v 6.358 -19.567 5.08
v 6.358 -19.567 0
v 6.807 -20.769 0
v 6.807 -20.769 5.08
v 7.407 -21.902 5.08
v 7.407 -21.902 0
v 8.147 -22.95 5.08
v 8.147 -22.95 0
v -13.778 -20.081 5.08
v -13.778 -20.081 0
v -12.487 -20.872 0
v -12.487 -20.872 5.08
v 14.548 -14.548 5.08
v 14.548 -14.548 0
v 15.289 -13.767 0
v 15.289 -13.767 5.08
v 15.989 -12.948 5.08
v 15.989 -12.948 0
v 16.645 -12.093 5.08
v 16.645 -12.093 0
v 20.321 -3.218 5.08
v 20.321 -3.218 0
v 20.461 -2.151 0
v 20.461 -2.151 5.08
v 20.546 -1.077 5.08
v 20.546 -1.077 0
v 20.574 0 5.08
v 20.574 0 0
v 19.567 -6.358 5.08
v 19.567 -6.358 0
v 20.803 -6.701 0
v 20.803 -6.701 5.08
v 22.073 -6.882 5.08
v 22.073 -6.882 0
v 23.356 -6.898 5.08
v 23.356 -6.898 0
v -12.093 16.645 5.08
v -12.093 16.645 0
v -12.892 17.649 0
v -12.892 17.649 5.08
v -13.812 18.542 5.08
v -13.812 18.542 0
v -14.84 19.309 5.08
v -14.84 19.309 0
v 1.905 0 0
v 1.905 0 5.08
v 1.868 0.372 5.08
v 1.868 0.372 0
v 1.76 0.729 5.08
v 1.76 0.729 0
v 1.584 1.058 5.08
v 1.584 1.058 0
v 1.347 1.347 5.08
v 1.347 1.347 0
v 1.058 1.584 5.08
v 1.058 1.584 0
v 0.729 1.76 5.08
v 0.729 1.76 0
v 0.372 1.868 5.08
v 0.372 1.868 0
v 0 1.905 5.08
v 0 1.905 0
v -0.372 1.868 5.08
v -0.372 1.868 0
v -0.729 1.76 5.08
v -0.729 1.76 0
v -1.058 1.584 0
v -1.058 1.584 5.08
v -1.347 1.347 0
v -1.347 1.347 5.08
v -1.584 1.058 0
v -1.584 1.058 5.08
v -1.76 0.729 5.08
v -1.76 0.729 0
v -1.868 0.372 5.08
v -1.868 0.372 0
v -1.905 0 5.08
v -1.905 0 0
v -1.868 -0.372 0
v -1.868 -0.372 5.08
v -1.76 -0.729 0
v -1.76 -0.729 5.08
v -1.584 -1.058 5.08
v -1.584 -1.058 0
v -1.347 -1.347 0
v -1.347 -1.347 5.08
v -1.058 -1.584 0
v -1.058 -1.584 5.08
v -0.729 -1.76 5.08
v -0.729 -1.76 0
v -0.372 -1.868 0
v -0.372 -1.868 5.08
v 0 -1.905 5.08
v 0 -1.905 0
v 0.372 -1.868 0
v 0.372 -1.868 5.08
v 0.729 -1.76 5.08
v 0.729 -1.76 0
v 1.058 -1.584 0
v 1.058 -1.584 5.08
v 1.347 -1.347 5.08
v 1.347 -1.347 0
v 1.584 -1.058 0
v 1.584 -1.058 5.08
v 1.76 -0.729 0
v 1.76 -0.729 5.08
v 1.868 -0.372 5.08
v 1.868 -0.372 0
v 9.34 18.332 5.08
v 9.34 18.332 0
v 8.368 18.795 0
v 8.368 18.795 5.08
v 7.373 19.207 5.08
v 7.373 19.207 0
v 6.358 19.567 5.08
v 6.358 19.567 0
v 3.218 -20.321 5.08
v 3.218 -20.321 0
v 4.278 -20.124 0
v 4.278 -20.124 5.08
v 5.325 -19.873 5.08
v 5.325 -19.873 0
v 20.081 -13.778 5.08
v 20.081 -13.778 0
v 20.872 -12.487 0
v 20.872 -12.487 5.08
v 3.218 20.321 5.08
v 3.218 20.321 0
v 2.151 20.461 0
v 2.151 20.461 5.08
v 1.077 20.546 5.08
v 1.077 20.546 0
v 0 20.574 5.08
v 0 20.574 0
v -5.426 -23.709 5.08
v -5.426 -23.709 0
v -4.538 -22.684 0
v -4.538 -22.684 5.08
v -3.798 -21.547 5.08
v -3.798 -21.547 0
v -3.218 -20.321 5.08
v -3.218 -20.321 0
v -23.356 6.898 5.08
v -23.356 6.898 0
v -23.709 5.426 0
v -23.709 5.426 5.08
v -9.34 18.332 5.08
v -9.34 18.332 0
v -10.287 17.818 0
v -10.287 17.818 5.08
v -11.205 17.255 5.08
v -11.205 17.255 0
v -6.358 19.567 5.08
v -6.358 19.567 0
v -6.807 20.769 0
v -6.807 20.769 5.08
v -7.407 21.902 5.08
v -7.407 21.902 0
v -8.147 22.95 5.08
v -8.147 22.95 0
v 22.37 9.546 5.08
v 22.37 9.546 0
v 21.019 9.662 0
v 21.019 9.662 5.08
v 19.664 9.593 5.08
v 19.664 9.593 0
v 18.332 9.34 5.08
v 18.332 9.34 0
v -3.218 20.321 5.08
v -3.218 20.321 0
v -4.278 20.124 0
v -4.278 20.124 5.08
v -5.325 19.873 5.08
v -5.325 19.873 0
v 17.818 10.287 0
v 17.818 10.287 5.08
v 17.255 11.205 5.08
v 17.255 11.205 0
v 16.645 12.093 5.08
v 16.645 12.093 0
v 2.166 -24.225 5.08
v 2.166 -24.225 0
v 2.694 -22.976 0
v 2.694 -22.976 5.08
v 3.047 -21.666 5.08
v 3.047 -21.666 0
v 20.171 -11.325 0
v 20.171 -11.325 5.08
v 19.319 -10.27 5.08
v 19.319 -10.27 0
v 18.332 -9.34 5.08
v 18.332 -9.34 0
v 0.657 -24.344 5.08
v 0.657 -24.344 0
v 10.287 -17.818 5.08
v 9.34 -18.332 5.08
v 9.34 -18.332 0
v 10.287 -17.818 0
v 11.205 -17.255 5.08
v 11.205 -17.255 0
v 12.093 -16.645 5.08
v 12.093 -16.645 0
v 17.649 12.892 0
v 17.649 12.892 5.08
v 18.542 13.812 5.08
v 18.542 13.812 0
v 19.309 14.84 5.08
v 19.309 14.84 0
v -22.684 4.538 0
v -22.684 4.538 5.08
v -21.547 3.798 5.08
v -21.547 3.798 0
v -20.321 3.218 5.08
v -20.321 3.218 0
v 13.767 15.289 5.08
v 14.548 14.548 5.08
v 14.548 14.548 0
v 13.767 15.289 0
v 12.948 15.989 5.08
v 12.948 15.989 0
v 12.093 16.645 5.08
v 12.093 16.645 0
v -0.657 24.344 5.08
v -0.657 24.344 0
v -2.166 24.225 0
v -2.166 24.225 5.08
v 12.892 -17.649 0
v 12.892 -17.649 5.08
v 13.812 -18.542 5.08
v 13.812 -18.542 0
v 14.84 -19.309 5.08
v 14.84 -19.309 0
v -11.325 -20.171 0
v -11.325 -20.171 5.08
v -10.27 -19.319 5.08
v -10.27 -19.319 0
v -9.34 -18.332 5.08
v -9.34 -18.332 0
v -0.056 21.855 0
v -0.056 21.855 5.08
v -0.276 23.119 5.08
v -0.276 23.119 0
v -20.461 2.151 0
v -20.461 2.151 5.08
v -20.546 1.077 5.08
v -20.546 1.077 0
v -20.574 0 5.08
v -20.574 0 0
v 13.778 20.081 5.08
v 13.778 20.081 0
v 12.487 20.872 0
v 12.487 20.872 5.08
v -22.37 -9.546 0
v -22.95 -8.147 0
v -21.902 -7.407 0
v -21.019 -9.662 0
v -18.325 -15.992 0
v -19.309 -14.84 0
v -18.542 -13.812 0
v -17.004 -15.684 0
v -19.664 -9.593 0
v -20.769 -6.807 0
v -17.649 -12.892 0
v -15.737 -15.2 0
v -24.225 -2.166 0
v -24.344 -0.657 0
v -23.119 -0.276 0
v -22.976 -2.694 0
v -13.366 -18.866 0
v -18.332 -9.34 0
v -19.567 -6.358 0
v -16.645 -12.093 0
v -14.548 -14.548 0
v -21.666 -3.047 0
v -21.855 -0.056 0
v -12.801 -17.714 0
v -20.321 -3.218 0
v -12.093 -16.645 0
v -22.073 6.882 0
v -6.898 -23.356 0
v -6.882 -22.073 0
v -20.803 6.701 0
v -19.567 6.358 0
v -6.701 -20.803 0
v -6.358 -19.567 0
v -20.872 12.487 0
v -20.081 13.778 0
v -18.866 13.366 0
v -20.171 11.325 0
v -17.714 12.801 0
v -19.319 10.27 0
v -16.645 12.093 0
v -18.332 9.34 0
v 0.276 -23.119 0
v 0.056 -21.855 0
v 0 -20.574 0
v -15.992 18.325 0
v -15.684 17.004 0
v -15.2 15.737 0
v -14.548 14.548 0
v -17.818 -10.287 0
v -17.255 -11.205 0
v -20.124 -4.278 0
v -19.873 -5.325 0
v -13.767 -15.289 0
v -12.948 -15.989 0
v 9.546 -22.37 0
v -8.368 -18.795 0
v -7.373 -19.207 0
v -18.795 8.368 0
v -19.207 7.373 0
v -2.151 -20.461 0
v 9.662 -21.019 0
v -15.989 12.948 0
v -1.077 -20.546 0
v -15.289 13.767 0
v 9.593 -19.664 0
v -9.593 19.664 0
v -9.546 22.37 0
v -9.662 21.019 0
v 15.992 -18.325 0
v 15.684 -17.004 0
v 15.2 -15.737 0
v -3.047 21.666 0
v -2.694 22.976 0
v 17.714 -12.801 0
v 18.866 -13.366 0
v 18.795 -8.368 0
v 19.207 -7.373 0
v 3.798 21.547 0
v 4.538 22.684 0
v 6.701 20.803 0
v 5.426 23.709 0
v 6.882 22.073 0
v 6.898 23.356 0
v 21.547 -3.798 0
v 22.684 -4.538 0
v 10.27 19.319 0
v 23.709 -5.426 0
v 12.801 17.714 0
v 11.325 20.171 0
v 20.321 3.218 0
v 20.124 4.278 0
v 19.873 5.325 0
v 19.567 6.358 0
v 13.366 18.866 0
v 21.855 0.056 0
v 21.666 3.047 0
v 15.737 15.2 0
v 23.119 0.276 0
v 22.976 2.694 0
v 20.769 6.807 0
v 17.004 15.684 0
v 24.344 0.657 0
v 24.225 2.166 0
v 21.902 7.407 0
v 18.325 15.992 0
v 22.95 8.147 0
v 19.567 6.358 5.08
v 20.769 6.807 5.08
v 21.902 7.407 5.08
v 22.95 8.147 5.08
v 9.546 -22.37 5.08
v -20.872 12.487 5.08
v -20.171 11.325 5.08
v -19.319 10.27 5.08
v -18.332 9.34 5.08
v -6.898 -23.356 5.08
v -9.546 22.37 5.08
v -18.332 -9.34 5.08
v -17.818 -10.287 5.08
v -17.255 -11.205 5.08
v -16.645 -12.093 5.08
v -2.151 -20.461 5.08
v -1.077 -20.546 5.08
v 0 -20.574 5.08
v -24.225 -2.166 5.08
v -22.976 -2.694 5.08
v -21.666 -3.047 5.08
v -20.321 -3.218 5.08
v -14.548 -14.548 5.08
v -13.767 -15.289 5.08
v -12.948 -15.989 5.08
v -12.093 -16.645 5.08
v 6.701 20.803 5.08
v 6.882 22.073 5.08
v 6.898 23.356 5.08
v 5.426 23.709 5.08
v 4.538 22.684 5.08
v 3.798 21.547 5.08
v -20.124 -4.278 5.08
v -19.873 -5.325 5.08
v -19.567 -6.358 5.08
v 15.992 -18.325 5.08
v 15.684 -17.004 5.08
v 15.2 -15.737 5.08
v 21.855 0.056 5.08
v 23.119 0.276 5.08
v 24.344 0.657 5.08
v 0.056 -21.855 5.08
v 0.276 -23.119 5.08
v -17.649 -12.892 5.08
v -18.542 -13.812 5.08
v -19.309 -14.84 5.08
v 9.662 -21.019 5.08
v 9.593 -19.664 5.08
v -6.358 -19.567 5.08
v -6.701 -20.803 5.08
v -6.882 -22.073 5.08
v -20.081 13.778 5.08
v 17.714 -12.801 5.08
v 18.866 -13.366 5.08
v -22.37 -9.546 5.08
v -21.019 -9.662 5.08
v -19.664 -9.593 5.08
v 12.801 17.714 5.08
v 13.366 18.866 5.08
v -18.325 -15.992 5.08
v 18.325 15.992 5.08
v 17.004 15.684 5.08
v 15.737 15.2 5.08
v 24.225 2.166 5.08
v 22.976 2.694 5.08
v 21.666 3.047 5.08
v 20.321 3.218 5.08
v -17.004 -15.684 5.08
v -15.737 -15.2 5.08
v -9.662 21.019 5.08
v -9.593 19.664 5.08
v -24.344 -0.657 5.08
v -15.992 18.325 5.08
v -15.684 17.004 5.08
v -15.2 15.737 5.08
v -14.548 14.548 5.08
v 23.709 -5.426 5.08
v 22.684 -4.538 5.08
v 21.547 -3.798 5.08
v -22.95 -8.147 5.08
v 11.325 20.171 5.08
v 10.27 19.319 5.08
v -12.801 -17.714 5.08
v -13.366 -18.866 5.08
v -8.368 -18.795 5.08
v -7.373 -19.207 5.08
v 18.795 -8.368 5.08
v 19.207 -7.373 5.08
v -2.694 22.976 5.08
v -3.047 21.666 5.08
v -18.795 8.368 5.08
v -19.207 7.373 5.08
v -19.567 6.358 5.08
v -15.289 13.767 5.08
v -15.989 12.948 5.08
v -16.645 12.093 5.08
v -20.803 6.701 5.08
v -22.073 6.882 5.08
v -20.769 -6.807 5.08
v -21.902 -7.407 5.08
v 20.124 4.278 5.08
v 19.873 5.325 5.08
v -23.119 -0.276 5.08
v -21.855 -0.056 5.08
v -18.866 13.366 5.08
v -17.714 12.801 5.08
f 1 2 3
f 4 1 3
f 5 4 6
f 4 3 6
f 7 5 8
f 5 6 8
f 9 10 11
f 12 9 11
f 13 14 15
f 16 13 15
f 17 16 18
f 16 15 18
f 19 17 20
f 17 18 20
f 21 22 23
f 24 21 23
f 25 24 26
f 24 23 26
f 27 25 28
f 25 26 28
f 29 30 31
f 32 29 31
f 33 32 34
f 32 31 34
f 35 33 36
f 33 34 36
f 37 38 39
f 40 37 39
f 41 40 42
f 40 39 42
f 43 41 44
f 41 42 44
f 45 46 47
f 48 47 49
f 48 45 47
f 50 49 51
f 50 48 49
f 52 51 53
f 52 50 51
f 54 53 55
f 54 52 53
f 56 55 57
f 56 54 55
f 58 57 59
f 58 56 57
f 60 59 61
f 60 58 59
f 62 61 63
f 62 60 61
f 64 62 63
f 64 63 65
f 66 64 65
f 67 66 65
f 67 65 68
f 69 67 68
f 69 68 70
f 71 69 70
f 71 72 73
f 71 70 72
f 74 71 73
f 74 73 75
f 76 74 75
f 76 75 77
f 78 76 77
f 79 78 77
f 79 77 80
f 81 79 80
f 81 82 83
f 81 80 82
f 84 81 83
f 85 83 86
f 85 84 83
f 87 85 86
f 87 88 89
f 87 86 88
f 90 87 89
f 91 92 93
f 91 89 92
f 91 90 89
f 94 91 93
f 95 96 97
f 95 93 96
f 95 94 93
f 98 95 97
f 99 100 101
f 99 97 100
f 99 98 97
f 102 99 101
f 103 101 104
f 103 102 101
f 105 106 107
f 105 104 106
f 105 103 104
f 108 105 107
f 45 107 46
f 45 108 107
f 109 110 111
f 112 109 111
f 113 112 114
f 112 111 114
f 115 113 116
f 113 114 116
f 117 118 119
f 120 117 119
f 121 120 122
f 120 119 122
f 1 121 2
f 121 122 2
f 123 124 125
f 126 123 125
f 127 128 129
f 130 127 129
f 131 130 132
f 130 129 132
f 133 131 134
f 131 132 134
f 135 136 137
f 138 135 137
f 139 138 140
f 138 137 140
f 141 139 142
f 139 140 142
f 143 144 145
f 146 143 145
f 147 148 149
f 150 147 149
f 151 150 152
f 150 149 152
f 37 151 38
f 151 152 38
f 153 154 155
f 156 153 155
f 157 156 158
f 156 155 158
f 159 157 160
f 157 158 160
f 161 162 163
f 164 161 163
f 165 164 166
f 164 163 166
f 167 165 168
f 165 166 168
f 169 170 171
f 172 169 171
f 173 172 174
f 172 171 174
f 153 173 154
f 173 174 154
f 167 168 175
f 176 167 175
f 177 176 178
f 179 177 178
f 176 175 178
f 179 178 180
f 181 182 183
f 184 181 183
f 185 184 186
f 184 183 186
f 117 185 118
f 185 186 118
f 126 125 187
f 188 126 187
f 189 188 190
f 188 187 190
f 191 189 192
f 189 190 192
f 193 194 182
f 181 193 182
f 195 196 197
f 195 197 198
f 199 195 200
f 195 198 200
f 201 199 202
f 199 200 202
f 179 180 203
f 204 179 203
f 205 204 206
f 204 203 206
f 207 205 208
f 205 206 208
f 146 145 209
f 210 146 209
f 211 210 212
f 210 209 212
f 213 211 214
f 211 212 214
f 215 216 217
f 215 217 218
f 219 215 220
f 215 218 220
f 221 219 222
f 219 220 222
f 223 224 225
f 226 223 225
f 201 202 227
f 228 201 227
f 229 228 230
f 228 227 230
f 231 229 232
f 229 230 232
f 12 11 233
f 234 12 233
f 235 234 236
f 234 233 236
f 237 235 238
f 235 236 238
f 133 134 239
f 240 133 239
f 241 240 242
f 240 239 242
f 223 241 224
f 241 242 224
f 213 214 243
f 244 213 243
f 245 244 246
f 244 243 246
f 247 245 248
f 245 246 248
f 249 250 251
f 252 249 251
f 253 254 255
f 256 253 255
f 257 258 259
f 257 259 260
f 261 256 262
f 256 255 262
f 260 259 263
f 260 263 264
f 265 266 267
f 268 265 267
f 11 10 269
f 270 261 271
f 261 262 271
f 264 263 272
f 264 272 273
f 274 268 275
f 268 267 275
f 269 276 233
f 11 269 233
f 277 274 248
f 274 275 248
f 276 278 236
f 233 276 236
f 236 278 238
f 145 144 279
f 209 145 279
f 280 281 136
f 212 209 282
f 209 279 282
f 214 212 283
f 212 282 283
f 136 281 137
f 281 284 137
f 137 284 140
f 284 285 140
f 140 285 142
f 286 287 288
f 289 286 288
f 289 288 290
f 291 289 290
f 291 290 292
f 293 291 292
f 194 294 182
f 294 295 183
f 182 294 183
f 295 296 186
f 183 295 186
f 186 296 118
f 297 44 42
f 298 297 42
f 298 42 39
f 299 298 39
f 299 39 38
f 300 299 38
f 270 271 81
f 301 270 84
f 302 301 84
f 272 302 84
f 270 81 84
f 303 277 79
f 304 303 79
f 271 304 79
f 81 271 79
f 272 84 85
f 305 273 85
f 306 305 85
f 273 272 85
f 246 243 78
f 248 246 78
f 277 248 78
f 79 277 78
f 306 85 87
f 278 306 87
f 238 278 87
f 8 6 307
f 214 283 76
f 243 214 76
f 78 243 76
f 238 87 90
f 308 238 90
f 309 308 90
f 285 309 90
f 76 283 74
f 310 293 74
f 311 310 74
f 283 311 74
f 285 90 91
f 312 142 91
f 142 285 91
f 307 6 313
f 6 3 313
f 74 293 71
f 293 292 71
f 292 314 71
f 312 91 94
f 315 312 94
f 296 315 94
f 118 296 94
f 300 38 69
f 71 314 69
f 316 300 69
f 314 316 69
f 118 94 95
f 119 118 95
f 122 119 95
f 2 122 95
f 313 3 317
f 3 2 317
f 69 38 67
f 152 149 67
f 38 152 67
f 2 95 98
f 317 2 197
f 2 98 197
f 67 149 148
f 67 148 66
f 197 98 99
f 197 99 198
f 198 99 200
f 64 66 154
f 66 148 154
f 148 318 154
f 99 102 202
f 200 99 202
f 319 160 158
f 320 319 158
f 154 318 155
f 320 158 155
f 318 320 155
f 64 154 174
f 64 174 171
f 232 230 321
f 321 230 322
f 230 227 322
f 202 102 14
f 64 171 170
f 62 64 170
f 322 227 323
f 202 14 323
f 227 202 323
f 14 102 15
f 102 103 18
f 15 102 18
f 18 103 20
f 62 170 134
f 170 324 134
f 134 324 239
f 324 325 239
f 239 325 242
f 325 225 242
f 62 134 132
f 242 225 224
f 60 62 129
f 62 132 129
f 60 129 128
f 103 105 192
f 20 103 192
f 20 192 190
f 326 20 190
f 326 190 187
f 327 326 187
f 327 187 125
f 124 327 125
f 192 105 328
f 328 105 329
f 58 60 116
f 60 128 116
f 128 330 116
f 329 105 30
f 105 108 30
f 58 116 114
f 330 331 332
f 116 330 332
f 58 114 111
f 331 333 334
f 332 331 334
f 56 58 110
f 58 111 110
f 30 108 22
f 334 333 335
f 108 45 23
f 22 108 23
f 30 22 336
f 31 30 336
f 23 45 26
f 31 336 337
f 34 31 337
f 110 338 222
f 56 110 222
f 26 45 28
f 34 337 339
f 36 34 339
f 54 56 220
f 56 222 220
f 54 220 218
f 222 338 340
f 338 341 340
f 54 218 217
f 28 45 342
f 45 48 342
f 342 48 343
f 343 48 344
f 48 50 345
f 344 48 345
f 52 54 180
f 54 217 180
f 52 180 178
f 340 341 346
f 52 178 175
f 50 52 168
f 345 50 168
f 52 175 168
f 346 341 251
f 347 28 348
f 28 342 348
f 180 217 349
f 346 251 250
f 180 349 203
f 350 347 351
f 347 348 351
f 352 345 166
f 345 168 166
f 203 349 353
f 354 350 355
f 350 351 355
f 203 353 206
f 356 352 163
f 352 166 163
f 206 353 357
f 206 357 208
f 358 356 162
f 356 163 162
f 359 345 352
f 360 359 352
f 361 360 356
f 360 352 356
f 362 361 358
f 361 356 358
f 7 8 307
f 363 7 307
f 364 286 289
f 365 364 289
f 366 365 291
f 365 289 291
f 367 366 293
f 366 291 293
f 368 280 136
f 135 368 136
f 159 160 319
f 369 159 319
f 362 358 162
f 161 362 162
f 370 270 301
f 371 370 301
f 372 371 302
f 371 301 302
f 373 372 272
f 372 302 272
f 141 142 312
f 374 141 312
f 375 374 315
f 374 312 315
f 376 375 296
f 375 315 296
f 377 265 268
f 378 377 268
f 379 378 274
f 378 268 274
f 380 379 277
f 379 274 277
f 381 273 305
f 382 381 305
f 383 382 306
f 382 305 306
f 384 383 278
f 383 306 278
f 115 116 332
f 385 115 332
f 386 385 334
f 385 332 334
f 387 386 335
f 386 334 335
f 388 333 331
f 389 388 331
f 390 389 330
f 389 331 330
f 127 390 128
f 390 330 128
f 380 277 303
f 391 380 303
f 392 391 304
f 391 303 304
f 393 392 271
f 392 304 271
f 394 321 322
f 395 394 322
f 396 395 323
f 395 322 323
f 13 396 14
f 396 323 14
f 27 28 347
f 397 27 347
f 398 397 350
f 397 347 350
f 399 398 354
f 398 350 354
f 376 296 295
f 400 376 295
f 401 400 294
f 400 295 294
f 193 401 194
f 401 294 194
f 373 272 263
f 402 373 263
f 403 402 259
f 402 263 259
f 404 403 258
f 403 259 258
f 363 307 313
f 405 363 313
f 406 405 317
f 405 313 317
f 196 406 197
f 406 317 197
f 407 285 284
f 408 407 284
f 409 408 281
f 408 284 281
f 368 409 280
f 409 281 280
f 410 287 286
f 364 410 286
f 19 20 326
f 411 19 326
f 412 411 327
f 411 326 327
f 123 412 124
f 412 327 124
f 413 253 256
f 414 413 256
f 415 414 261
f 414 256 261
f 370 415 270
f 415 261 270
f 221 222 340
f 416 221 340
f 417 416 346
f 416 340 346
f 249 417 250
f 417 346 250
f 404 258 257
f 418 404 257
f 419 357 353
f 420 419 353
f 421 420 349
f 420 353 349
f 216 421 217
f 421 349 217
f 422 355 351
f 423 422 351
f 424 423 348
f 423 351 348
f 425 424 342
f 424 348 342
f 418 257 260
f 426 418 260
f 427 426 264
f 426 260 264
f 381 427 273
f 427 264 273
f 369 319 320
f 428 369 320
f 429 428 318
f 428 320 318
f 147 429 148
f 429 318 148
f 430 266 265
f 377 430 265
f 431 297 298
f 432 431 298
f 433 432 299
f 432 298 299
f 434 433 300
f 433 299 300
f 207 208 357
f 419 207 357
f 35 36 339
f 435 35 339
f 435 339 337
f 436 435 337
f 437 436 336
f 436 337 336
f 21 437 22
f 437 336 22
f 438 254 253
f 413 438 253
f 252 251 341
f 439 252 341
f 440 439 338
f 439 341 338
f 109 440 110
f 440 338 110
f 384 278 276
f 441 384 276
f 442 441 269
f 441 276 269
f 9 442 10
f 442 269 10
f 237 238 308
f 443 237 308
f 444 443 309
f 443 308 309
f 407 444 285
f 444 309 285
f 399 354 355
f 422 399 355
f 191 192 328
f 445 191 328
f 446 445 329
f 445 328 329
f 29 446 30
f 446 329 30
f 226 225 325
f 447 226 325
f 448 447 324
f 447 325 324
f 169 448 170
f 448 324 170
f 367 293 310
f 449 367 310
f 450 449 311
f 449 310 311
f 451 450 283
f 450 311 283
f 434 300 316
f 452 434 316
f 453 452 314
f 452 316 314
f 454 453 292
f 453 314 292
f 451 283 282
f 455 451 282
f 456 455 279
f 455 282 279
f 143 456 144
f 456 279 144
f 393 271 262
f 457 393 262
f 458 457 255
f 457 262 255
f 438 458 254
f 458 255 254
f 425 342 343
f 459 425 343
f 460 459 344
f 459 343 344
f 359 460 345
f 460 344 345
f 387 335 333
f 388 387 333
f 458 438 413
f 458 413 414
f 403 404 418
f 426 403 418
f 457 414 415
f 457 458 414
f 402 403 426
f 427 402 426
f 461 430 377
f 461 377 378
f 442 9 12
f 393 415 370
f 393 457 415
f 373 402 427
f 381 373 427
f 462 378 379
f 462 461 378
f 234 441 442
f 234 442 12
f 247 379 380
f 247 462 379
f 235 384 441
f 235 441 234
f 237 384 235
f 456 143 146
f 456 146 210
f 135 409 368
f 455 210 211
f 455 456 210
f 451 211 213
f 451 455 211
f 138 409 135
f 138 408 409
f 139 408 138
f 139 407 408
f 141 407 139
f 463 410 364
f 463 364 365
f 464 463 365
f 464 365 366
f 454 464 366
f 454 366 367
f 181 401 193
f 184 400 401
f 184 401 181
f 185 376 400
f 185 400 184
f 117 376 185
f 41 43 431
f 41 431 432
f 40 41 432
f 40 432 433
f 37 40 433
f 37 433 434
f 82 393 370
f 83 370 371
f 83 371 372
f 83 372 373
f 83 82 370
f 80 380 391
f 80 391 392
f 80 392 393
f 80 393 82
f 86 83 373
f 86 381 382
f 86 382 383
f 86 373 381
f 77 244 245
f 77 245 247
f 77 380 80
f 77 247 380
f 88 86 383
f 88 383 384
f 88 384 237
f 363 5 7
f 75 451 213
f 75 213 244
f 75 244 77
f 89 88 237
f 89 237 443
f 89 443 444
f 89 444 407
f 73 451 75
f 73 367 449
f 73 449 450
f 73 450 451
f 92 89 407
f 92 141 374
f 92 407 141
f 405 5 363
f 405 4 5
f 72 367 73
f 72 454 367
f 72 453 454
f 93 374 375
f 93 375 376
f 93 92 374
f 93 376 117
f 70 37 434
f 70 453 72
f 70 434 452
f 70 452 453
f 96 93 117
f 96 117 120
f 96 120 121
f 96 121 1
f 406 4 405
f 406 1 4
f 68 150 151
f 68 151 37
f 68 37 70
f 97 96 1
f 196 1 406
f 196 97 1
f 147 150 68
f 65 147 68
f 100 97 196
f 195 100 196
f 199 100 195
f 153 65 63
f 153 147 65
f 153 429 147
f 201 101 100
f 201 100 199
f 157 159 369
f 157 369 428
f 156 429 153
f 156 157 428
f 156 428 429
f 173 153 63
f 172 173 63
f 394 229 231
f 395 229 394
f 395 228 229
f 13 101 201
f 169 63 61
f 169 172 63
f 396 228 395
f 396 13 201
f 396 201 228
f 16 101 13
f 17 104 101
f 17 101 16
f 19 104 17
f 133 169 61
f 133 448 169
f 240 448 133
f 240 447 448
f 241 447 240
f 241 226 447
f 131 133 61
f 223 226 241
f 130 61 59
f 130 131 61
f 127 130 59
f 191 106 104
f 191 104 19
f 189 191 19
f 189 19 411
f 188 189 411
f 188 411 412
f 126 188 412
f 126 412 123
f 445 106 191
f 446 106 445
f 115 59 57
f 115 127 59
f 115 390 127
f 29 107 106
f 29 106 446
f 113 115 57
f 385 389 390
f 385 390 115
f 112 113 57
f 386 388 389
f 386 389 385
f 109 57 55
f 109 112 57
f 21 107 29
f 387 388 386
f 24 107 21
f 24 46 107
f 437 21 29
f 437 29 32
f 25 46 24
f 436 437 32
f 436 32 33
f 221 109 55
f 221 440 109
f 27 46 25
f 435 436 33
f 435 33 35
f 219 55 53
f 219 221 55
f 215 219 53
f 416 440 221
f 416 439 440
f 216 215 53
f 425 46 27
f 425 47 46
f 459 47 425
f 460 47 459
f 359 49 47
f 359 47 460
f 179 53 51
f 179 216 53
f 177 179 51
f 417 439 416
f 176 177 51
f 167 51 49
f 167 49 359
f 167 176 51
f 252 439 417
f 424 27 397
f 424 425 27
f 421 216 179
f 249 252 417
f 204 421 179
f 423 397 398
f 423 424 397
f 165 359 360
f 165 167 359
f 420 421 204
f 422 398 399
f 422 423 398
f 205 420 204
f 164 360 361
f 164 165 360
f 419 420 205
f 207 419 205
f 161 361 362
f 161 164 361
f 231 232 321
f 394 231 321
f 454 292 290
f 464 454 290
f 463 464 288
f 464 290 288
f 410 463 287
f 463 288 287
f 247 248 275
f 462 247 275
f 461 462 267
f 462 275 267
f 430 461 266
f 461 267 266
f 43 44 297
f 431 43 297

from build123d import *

# Parameters (mm, degrees)
F0_R     = 1.905
F1_DEPTH = 5.08
F2_COUNT = 20


with BuildPart() as f1:
    # F0 (on Top) → F1 (new body)
    with BuildSketch(Plane.XY):
        with BuildLine():
            ThreePointArc((24.2252784515, 2.1664437984), (22.3269265727, 2.8926485832), (20.3206999194, 3.2184826837))
            ThreePointArc((20.3206999194, 3.2184826837), (-20.5105772242, -1.6142174355), (20.574, 0))
            ThreePointArc((20.574, 0), (22.4908742639, 0.1455516853), (24.3441105881, 0.6565383418))
            Line((24.3441105881, 0.6565383418), (24.2252784515, 2.1664437984))
        make_face()
        Circle(F0_R, mode=Mode.SUBTRACT)
    extrude(amount=F1_DEPTH)

    # F2: F1 ×20 about axis
    f2_axis = Axis((0, 0, 0), (0, 0, 1))


with BuildPart() as f1_1:
    add(f1.part)
    for i in range(1, F2_COUNT):
        add(f1.part.rotate(f2_axis, i * 360 / F2_COUNT))


solid = f1_1.part
